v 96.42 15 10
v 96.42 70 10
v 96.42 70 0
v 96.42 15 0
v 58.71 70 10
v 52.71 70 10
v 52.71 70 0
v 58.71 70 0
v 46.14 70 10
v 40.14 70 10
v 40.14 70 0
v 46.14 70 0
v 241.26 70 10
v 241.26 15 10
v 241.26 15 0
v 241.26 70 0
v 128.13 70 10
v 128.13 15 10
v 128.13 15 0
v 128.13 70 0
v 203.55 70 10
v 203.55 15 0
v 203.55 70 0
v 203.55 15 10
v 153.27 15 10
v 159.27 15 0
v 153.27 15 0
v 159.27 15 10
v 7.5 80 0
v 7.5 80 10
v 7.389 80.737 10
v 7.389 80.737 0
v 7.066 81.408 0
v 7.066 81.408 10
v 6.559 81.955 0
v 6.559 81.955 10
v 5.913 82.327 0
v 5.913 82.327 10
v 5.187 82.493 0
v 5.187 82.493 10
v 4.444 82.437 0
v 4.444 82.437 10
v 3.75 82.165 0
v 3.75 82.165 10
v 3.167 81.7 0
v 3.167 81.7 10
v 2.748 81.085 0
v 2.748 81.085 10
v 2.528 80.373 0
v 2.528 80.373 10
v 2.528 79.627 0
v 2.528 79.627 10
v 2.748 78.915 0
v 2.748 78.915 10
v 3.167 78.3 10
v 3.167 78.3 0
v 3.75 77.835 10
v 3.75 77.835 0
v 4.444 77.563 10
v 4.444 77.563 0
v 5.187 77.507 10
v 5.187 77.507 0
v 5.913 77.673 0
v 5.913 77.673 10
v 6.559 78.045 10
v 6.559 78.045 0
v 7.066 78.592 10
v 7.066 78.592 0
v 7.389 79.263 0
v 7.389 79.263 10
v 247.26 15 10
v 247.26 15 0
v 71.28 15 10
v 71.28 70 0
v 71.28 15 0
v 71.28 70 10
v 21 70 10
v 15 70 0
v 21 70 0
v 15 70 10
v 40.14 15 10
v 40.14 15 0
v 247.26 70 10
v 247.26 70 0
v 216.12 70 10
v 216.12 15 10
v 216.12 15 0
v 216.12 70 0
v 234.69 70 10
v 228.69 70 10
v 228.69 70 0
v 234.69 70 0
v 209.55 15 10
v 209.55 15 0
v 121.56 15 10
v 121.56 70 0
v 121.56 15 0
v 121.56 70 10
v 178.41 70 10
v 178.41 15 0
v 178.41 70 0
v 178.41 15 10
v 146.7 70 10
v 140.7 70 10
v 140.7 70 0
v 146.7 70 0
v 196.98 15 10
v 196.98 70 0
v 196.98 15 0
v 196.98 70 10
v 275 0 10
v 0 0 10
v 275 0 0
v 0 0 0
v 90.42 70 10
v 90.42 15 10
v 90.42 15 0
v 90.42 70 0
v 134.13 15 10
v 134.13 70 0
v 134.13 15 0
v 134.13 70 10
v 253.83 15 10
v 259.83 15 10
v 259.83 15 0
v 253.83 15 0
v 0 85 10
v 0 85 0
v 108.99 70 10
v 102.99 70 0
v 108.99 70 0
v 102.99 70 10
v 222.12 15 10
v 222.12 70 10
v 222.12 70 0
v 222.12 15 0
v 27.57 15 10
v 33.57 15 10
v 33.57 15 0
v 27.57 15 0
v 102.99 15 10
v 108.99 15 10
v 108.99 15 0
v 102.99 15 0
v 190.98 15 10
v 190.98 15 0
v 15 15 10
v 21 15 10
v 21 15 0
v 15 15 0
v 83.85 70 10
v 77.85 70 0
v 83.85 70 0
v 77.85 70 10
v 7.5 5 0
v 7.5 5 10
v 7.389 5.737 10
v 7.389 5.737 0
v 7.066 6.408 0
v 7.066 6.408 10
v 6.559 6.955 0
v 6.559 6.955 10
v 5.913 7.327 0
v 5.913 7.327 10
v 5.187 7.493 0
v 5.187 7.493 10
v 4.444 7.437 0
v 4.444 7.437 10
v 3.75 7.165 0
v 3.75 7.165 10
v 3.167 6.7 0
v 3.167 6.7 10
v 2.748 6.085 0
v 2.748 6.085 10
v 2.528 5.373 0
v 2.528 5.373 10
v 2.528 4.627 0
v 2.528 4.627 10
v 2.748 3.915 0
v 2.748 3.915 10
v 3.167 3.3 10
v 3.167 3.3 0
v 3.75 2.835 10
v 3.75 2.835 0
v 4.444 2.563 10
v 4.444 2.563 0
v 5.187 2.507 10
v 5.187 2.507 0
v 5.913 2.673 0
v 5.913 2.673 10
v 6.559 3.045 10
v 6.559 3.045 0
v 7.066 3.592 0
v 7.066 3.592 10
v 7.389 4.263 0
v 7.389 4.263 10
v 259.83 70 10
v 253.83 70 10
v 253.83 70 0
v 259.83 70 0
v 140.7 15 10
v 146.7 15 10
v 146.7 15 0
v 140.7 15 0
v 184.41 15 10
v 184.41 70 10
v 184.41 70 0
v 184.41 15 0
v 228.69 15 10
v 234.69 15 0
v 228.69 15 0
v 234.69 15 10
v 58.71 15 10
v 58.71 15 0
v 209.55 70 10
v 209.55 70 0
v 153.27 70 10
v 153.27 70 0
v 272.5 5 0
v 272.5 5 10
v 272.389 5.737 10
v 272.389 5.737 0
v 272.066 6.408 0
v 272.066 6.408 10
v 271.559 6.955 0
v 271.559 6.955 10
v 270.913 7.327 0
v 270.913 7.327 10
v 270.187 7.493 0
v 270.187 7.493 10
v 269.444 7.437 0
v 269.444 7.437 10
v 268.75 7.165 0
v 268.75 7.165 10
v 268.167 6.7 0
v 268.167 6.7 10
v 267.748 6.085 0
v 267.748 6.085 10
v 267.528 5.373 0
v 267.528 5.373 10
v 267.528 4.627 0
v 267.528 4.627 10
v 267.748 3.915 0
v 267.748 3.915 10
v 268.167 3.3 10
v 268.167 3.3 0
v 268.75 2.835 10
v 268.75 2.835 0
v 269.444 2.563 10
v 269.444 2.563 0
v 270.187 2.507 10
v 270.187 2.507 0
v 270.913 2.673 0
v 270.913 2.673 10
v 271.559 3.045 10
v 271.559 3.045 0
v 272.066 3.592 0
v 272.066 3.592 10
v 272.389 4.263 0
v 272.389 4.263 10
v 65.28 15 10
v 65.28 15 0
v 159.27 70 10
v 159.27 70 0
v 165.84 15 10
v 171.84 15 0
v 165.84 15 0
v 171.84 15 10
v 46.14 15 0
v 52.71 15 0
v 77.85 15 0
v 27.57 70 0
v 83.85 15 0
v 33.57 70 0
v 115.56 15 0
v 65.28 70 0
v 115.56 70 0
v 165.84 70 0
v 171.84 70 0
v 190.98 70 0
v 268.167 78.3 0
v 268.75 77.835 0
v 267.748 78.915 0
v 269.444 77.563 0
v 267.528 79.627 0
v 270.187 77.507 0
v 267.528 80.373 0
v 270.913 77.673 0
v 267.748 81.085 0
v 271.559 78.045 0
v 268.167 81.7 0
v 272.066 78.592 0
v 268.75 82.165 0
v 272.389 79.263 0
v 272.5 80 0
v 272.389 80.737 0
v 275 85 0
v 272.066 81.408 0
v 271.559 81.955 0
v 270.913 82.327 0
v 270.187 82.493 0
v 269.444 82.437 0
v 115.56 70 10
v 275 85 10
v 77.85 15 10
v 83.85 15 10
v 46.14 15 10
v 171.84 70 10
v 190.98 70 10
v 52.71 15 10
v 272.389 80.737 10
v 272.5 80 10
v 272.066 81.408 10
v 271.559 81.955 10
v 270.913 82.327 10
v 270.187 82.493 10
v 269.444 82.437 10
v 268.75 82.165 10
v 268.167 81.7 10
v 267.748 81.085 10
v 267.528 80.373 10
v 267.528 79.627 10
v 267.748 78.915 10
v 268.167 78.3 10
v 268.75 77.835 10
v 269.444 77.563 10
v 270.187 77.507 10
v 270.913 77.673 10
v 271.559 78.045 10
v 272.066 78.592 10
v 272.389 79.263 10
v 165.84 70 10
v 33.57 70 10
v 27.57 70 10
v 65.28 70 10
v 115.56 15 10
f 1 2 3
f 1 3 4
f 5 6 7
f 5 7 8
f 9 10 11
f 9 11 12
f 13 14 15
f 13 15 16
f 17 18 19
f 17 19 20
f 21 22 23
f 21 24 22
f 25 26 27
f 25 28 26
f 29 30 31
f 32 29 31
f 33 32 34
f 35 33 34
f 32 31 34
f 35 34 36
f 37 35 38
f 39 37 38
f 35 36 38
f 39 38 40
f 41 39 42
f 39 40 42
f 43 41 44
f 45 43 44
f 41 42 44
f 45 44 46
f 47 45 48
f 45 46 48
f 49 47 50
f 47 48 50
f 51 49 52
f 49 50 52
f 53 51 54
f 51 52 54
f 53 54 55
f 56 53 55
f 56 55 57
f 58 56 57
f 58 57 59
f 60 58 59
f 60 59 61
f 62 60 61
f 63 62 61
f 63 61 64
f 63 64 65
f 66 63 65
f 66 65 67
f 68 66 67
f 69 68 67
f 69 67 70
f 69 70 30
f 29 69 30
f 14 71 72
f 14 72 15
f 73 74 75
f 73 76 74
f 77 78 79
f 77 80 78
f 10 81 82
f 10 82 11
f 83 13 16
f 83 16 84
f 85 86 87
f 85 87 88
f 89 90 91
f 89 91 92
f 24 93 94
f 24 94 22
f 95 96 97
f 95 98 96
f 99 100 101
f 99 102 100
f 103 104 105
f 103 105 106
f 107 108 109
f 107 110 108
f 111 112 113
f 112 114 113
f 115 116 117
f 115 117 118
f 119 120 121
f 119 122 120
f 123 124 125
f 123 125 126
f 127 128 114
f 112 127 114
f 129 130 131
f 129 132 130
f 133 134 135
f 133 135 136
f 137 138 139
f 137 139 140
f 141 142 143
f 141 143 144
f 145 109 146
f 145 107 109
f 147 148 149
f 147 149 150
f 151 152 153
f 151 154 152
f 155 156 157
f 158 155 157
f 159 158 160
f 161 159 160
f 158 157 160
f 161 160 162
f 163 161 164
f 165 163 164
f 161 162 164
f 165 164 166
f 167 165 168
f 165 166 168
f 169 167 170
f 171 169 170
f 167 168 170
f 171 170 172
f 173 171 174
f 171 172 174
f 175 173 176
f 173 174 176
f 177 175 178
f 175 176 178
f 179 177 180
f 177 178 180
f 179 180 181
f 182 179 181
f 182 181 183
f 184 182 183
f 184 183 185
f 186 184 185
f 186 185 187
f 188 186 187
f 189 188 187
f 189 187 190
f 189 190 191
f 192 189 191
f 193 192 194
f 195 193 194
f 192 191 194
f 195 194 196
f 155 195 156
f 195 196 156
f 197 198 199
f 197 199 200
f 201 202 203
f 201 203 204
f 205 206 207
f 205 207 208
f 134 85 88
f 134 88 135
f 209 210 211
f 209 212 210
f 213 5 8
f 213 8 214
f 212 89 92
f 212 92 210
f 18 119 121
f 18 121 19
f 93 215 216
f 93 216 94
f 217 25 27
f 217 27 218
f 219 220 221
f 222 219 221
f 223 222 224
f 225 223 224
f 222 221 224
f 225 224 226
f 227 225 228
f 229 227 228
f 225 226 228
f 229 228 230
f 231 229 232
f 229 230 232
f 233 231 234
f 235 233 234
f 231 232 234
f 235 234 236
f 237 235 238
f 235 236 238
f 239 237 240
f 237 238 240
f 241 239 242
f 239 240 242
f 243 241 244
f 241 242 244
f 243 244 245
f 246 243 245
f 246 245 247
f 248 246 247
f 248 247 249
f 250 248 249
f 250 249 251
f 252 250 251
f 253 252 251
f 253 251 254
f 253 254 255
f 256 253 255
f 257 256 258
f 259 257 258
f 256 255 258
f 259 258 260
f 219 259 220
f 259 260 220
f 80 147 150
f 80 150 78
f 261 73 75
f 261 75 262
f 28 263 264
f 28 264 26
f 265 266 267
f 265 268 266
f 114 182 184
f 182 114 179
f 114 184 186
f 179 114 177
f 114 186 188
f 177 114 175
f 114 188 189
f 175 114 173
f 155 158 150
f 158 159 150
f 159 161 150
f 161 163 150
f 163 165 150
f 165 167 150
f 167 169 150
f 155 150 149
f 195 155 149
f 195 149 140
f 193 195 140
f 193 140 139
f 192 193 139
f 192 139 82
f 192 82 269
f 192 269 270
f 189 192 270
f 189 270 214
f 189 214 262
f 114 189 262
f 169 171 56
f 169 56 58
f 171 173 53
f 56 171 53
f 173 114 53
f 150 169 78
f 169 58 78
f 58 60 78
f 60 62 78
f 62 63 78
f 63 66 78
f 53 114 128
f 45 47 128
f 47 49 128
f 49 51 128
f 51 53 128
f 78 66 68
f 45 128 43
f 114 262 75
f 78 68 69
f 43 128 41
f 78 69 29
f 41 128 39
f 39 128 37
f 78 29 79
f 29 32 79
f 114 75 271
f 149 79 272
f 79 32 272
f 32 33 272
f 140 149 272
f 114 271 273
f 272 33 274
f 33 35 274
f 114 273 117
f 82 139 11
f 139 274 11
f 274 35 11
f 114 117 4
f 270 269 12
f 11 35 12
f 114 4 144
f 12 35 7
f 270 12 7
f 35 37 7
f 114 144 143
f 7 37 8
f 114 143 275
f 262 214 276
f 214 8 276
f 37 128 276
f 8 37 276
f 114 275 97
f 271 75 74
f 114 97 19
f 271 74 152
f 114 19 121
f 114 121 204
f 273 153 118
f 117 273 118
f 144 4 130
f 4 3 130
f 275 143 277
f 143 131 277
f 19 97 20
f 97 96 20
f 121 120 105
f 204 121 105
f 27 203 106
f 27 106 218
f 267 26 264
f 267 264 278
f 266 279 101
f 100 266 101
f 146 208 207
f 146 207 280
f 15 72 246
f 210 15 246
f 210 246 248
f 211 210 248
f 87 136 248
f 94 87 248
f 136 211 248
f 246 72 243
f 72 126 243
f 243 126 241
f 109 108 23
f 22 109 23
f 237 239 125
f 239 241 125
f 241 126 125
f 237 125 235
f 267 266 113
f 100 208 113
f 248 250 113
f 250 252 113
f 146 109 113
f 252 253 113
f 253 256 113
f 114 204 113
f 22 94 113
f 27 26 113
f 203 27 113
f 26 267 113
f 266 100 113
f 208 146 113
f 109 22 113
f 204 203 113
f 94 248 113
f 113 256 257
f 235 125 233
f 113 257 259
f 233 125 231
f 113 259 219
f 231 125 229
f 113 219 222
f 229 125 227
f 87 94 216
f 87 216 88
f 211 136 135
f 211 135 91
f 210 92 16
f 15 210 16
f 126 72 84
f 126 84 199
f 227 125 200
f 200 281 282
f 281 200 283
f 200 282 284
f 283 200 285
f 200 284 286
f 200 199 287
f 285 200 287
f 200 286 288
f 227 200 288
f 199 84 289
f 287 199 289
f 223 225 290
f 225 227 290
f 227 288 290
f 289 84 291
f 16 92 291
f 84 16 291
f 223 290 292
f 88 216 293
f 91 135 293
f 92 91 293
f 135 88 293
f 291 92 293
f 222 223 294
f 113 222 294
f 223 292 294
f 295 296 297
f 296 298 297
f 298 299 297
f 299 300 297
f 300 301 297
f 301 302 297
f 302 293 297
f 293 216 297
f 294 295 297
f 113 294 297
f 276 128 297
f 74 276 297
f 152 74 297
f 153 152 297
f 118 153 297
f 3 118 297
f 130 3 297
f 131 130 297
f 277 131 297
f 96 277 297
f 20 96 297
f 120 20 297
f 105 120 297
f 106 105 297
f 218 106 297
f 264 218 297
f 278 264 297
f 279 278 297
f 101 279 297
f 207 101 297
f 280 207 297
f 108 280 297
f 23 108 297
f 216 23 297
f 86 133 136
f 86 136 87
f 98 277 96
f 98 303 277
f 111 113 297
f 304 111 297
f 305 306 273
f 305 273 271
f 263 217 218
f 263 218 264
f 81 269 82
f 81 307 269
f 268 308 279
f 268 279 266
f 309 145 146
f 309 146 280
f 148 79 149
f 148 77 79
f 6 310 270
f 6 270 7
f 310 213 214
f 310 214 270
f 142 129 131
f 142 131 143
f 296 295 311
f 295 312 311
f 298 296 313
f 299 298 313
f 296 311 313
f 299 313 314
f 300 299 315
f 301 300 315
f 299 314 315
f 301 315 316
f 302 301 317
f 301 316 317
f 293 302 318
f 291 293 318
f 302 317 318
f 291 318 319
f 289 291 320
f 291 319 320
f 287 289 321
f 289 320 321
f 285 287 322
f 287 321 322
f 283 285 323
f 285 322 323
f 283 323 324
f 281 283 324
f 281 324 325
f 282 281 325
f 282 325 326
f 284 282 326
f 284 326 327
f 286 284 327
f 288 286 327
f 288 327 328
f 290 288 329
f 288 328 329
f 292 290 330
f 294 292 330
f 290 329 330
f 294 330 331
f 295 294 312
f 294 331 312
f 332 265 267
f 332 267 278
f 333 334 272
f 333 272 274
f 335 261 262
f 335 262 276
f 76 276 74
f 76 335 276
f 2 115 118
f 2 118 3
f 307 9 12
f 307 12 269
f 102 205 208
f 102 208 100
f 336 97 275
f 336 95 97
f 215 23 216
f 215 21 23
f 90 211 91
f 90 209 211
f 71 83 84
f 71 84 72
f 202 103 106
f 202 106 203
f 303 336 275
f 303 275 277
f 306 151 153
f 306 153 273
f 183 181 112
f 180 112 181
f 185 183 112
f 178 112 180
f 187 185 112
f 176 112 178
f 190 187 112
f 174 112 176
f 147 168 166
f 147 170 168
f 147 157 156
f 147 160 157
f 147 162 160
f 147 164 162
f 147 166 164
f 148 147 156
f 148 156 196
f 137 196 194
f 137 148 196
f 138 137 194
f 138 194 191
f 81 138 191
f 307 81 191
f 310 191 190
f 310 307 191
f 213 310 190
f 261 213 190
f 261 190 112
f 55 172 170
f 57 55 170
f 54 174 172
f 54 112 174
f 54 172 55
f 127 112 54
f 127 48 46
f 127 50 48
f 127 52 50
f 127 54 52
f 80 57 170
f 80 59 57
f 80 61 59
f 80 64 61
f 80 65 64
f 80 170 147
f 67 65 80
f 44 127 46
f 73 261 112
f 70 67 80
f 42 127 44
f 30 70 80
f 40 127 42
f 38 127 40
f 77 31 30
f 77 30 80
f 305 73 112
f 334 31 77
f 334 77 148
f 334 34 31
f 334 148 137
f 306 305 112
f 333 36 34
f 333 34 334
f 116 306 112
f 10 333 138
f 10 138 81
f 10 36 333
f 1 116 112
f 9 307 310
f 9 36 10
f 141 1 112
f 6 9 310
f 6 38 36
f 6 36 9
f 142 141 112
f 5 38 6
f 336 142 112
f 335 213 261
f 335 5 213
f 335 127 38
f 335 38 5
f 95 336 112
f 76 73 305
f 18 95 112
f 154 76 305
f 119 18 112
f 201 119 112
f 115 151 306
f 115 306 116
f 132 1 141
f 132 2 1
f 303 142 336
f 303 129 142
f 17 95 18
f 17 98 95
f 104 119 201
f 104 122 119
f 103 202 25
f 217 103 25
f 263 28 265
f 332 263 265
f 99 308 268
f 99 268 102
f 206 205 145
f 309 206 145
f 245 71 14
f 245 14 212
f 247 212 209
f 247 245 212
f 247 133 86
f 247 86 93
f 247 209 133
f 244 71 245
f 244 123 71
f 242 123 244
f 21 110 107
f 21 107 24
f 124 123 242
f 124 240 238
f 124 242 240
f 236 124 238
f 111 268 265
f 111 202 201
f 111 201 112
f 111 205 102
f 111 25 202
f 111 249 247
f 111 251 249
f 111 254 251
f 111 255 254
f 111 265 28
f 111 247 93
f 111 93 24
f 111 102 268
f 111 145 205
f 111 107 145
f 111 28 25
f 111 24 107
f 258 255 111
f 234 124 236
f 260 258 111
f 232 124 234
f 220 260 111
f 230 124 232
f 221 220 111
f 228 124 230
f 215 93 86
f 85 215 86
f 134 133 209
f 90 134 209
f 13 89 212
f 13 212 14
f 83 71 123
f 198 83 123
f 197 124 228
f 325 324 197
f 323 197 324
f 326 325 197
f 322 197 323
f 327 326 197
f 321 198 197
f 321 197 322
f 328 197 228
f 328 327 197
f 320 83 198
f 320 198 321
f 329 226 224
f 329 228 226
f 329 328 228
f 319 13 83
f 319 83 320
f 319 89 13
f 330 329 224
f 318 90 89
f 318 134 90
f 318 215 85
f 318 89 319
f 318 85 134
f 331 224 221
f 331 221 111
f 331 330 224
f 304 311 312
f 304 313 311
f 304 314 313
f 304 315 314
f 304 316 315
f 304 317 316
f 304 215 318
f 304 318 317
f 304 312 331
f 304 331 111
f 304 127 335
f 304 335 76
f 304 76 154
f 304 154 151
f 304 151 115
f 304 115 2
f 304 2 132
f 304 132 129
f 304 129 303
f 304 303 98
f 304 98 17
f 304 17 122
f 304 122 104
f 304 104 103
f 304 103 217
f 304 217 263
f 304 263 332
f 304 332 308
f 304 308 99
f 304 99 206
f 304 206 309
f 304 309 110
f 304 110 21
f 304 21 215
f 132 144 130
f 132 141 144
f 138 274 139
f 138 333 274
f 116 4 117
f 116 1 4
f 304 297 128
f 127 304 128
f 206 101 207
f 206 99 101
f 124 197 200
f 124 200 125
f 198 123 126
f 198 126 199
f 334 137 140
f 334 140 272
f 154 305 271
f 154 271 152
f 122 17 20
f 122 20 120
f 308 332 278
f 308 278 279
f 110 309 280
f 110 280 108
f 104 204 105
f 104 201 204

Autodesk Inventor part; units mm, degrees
ref_plane "YZ Plane" through (0, 0, 0) normal (1, 0, 0) x (0, 1, 0)
ref_plane "XZ Plane" through (0, 0, 0) normal (0, 1, 0) x (-1, 0, 0)
ref_plane "XY Plane" through (0, 0, 0) normal (0, 0, 1) x (1, 0, 0)
sketch "Sketch1" plane through (0, 0, 0) normal (0, 0, 1) x (1, 0, 0)
  line L0 (0, 0) -> (275, 0)
  line L1 (275, 0) -> (275, 85)
  line L2 (275, 85) -> (0, 85)
  line L3 (0, 85) -> (0, 0)
  dimension "d0" = 275
  dimension "d1" = 85
extrude "Extrusion1" add sketch "Sketch1" along normal blind 10
sketch "Sketch2" plane through (0, 0, 10) normal (0, 0, 1) x (1, 0, 0)
  line L0 (0, 0) -> (275, 0) construction
  line L1 (275, 0) -> (275, 85) construction
  line L2 (275, 85) -> (0, 85) construction
  line L3 (0, 85) -> (0, 0) construction
  line L4 (5, 80) -> (270, 80) construction
  line L5 (270, 80) -> (270, 5) construction
  line L6 (270, 5) -> (5, 5) construction
  line L7 (5, 5) -> (5, 80) construction
  line L8 (10, 75) -> (265, 75) construction
  line L9 (265, 75) -> (265, 10) construction
  line L10 (265, 10) -> (10, 10) construction
  line L11 (10, 10) -> (10, 75) construction
  circle A0 centre (5, 80) radius 2.5
  circle A1 centre (270, 80) radius 2.5
  circle A2 centre (270, 5) radius 2.5
  circle A3 centre (5, 5) radius 2.5
  line L12 (15, 70) -> (21, 70)
  line L13 (21, 70) -> (21, 15)
  line L14 (21, 15) -> (15, 15)
  line L15 (15, 15) -> (15, 70)
  line L16 (15, 70) -> (260, 70) construction
  line L17 (260, 70) -> (260, 15) construction
  line L18 (260, 15) -> (15, 15) construction
  line L19 (15, 15) -> (15, 70) construction
  line L20 (33.57, 70) -> (33.57, 15)
  line L21 (27.57, 70) -> (33.57, 70)
  line L22 (27.57, 15) -> (27.57, 70)
  line L23 (27.57, 15) -> (27.57, 70) construction
  line L24 (33.57, 15) -> (27.57, 15)
  line L25 (46.14, 70) -> (46.14, 15)
  line L26 (40.14, 70) -> (46.14, 70)
  line L27 (40.14, 15) -> (40.14, 70)
  line L28 (40.14, 15) -> (40.14, 70) construction
  line L29 (46.14, 15) -> (40.14, 15)
  line L30 (58.71, 70) -> (58.71, 15)
  line L31 (52.71, 70) -> (58.71, 70)
  line L32 (52.71, 15) -> (52.71, 70)
  line L33 (52.71, 15) -> (52.71, 70) construction
  line L34 (58.71, 15) -> (52.71, 15)
  line L35 (71.28, 70) -> (71.28, 15)
  line L36 (65.28, 70) -> (71.28, 70)
  line L37 (65.28, 15) -> (65.28, 70)
  line L38 (65.28, 15) -> (65.28, 70) construction
  line L39 (71.28, 15) -> (65.28, 15)
  line L40 (83.85, 70) -> (83.85, 15)
  line L41 (77.85, 70) -> (83.85, 70)
  line L42 (77.85, 15) -> (77.85, 70)
  line L43 (77.85, 15) -> (77.85, 70) construction
  line L44 (83.85, 15) -> (77.85, 15)
  line L45 (96.42, 70) -> (96.42, 15)
  line L46 (90.42, 70) -> (96.42, 70)
  line L47 (90.42, 15) -> (90.42, 70)
  line L48 (90.42, 15) -> (90.42, 70) construction
  line L49 (96.42, 15) -> (90.42, 15)
  line L50 (108.99, 70) -> (108.99, 15)
  line L51 (102.99, 70) -> (108.99, 70)
  line L52 (102.99, 15) -> (102.99, 70)
  line L53 (102.99, 15) -> (102.99, 70) construction
  line L54 (108.99, 15) -> (102.99, 15)
  line L55 (121.56, 70) -> (121.56, 15)
  line L56 (115.56, 70) -> (121.56, 70)
  line L57 (115.56, 15) -> (115.56, 70)
  line L58 (115.56, 15) -> (115.56, 70) construction
  line L59 (121.56, 15) -> (115.56, 15)
  line L60 (134.13, 70) -> (134.13, 15)
  line L61 (128.13, 70) -> (134.13, 70)
  line L62 (128.13, 15) -> (128.13, 70)
  line L63 (128.13, 15) -> (128.13, 70) construction
  line L64 (134.13, 15) -> (128.13, 15)
  line L65 (146.7, 70) -> (146.7, 15)
  line L66 (140.7, 70) -> (146.7, 70)
  line L67 (140.7, 15) -> (140.7, 70)
  line L68 (140.7, 15) -> (140.7, 70) construction
  line L69 (146.7, 15) -> (140.7, 15)
  line L70 (159.27, 70) -> (159.27, 15)
  line L71 (153.27, 70) -> (159.27, 70)
  line L72 (153.27, 15) -> (153.27, 70)
  line L73 (153.27, 15) -> (153.27, 70) construction
  line L74 (159.27, 15) -> (153.27, 15)
  line L75 (171.84, 70) -> (171.84, 15)
  line L76 (165.84, 70) -> (171.84, 70)
  line L77 (165.84, 15) -> (165.84, 70)
  line L78 (165.84, 15) -> (165.84, 70) construction
  line L79 (171.84, 15) -> (165.84, 15)
  line L80 (184.41, 70) -> (184.41, 15)
  line L81 (178.41, 70) -> (184.41, 70)
  line L82 (178.41, 15) -> (178.41, 70)
  line L83 (178.41, 15) -> (178.41, 70) construction
  line L84 (184.41, 15) -> (178.41, 15)
  line L85 (196.98, 70) -> (196.98, 15)
  line L86 (190.98, 70) -> (196.98, 70)
  line L87 (190.98, 15) -> (190.98, 70)
  line L88 (190.98, 15) -> (190.98, 70) construction
  line L89 (196.98, 15) -> (190.98, 15)
  line L90 (209.55, 70) -> (209.55, 15)
  line L91 (203.55, 70) -> (209.55, 70)
  line L92 (203.55, 15) -> (203.55, 70)
  line L93 (203.55, 15) -> (203.55, 70) construction
  line L94 (209.55, 15) -> (203.55, 15)
  line L95 (222.12, 70) -> (222.12, 15)
  line L96 (216.12, 70) -> (222.12, 70)
  line L97 (216.12, 15) -> (216.12, 70)
  line L98 (216.12, 15) -> (216.12, 70) construction
  line L99 (222.12, 15) -> (216.12, 15)
  line L100 (234.69, 70) -> (234.69, 15)
  line L101 (228.69, 70) -> (234.69, 70)
  line L102 (228.69, 15) -> (228.69, 70)
  line L103 (228.69, 15) -> (228.69, 70) construction
  line L104 (234.69, 15) -> (228.69, 15)
  line L105 (247.26, 70) -> (247.26, 15)
  line L106 (241.26, 70) -> (247.26, 70)
  line L107 (241.26, 15) -> (241.26, 70)
  line L108 (241.26, 15) -> (241.26, 70) construction
  line L109 (247.26, 15) -> (241.26, 15)
  line L110 (259.83, 70) -> (259.83, 15)
  line L111 (253.83, 70) -> (259.83, 70)
  line L112 (253.83, 15) -> (253.83, 70)
  line L113 (253.83, 15) -> (253.83, 70) construction
  line L114 (259.83, 15) -> (253.83, 15)
  dimension "d4" = 5
  dimension "d5" = 10
  dimension "d6" = 5
  dimension "d7" = 5
  dimension "d8" = 5
  dimension "d9" = 5
  dimension "d10" = 6
  dimension "d11" = 15
  dimension "d14" = 12.57
extrude "Extrusion2" cut sketch "Sketch2" against normal through all
properties part number "HA006" material "ABS Plastic"
